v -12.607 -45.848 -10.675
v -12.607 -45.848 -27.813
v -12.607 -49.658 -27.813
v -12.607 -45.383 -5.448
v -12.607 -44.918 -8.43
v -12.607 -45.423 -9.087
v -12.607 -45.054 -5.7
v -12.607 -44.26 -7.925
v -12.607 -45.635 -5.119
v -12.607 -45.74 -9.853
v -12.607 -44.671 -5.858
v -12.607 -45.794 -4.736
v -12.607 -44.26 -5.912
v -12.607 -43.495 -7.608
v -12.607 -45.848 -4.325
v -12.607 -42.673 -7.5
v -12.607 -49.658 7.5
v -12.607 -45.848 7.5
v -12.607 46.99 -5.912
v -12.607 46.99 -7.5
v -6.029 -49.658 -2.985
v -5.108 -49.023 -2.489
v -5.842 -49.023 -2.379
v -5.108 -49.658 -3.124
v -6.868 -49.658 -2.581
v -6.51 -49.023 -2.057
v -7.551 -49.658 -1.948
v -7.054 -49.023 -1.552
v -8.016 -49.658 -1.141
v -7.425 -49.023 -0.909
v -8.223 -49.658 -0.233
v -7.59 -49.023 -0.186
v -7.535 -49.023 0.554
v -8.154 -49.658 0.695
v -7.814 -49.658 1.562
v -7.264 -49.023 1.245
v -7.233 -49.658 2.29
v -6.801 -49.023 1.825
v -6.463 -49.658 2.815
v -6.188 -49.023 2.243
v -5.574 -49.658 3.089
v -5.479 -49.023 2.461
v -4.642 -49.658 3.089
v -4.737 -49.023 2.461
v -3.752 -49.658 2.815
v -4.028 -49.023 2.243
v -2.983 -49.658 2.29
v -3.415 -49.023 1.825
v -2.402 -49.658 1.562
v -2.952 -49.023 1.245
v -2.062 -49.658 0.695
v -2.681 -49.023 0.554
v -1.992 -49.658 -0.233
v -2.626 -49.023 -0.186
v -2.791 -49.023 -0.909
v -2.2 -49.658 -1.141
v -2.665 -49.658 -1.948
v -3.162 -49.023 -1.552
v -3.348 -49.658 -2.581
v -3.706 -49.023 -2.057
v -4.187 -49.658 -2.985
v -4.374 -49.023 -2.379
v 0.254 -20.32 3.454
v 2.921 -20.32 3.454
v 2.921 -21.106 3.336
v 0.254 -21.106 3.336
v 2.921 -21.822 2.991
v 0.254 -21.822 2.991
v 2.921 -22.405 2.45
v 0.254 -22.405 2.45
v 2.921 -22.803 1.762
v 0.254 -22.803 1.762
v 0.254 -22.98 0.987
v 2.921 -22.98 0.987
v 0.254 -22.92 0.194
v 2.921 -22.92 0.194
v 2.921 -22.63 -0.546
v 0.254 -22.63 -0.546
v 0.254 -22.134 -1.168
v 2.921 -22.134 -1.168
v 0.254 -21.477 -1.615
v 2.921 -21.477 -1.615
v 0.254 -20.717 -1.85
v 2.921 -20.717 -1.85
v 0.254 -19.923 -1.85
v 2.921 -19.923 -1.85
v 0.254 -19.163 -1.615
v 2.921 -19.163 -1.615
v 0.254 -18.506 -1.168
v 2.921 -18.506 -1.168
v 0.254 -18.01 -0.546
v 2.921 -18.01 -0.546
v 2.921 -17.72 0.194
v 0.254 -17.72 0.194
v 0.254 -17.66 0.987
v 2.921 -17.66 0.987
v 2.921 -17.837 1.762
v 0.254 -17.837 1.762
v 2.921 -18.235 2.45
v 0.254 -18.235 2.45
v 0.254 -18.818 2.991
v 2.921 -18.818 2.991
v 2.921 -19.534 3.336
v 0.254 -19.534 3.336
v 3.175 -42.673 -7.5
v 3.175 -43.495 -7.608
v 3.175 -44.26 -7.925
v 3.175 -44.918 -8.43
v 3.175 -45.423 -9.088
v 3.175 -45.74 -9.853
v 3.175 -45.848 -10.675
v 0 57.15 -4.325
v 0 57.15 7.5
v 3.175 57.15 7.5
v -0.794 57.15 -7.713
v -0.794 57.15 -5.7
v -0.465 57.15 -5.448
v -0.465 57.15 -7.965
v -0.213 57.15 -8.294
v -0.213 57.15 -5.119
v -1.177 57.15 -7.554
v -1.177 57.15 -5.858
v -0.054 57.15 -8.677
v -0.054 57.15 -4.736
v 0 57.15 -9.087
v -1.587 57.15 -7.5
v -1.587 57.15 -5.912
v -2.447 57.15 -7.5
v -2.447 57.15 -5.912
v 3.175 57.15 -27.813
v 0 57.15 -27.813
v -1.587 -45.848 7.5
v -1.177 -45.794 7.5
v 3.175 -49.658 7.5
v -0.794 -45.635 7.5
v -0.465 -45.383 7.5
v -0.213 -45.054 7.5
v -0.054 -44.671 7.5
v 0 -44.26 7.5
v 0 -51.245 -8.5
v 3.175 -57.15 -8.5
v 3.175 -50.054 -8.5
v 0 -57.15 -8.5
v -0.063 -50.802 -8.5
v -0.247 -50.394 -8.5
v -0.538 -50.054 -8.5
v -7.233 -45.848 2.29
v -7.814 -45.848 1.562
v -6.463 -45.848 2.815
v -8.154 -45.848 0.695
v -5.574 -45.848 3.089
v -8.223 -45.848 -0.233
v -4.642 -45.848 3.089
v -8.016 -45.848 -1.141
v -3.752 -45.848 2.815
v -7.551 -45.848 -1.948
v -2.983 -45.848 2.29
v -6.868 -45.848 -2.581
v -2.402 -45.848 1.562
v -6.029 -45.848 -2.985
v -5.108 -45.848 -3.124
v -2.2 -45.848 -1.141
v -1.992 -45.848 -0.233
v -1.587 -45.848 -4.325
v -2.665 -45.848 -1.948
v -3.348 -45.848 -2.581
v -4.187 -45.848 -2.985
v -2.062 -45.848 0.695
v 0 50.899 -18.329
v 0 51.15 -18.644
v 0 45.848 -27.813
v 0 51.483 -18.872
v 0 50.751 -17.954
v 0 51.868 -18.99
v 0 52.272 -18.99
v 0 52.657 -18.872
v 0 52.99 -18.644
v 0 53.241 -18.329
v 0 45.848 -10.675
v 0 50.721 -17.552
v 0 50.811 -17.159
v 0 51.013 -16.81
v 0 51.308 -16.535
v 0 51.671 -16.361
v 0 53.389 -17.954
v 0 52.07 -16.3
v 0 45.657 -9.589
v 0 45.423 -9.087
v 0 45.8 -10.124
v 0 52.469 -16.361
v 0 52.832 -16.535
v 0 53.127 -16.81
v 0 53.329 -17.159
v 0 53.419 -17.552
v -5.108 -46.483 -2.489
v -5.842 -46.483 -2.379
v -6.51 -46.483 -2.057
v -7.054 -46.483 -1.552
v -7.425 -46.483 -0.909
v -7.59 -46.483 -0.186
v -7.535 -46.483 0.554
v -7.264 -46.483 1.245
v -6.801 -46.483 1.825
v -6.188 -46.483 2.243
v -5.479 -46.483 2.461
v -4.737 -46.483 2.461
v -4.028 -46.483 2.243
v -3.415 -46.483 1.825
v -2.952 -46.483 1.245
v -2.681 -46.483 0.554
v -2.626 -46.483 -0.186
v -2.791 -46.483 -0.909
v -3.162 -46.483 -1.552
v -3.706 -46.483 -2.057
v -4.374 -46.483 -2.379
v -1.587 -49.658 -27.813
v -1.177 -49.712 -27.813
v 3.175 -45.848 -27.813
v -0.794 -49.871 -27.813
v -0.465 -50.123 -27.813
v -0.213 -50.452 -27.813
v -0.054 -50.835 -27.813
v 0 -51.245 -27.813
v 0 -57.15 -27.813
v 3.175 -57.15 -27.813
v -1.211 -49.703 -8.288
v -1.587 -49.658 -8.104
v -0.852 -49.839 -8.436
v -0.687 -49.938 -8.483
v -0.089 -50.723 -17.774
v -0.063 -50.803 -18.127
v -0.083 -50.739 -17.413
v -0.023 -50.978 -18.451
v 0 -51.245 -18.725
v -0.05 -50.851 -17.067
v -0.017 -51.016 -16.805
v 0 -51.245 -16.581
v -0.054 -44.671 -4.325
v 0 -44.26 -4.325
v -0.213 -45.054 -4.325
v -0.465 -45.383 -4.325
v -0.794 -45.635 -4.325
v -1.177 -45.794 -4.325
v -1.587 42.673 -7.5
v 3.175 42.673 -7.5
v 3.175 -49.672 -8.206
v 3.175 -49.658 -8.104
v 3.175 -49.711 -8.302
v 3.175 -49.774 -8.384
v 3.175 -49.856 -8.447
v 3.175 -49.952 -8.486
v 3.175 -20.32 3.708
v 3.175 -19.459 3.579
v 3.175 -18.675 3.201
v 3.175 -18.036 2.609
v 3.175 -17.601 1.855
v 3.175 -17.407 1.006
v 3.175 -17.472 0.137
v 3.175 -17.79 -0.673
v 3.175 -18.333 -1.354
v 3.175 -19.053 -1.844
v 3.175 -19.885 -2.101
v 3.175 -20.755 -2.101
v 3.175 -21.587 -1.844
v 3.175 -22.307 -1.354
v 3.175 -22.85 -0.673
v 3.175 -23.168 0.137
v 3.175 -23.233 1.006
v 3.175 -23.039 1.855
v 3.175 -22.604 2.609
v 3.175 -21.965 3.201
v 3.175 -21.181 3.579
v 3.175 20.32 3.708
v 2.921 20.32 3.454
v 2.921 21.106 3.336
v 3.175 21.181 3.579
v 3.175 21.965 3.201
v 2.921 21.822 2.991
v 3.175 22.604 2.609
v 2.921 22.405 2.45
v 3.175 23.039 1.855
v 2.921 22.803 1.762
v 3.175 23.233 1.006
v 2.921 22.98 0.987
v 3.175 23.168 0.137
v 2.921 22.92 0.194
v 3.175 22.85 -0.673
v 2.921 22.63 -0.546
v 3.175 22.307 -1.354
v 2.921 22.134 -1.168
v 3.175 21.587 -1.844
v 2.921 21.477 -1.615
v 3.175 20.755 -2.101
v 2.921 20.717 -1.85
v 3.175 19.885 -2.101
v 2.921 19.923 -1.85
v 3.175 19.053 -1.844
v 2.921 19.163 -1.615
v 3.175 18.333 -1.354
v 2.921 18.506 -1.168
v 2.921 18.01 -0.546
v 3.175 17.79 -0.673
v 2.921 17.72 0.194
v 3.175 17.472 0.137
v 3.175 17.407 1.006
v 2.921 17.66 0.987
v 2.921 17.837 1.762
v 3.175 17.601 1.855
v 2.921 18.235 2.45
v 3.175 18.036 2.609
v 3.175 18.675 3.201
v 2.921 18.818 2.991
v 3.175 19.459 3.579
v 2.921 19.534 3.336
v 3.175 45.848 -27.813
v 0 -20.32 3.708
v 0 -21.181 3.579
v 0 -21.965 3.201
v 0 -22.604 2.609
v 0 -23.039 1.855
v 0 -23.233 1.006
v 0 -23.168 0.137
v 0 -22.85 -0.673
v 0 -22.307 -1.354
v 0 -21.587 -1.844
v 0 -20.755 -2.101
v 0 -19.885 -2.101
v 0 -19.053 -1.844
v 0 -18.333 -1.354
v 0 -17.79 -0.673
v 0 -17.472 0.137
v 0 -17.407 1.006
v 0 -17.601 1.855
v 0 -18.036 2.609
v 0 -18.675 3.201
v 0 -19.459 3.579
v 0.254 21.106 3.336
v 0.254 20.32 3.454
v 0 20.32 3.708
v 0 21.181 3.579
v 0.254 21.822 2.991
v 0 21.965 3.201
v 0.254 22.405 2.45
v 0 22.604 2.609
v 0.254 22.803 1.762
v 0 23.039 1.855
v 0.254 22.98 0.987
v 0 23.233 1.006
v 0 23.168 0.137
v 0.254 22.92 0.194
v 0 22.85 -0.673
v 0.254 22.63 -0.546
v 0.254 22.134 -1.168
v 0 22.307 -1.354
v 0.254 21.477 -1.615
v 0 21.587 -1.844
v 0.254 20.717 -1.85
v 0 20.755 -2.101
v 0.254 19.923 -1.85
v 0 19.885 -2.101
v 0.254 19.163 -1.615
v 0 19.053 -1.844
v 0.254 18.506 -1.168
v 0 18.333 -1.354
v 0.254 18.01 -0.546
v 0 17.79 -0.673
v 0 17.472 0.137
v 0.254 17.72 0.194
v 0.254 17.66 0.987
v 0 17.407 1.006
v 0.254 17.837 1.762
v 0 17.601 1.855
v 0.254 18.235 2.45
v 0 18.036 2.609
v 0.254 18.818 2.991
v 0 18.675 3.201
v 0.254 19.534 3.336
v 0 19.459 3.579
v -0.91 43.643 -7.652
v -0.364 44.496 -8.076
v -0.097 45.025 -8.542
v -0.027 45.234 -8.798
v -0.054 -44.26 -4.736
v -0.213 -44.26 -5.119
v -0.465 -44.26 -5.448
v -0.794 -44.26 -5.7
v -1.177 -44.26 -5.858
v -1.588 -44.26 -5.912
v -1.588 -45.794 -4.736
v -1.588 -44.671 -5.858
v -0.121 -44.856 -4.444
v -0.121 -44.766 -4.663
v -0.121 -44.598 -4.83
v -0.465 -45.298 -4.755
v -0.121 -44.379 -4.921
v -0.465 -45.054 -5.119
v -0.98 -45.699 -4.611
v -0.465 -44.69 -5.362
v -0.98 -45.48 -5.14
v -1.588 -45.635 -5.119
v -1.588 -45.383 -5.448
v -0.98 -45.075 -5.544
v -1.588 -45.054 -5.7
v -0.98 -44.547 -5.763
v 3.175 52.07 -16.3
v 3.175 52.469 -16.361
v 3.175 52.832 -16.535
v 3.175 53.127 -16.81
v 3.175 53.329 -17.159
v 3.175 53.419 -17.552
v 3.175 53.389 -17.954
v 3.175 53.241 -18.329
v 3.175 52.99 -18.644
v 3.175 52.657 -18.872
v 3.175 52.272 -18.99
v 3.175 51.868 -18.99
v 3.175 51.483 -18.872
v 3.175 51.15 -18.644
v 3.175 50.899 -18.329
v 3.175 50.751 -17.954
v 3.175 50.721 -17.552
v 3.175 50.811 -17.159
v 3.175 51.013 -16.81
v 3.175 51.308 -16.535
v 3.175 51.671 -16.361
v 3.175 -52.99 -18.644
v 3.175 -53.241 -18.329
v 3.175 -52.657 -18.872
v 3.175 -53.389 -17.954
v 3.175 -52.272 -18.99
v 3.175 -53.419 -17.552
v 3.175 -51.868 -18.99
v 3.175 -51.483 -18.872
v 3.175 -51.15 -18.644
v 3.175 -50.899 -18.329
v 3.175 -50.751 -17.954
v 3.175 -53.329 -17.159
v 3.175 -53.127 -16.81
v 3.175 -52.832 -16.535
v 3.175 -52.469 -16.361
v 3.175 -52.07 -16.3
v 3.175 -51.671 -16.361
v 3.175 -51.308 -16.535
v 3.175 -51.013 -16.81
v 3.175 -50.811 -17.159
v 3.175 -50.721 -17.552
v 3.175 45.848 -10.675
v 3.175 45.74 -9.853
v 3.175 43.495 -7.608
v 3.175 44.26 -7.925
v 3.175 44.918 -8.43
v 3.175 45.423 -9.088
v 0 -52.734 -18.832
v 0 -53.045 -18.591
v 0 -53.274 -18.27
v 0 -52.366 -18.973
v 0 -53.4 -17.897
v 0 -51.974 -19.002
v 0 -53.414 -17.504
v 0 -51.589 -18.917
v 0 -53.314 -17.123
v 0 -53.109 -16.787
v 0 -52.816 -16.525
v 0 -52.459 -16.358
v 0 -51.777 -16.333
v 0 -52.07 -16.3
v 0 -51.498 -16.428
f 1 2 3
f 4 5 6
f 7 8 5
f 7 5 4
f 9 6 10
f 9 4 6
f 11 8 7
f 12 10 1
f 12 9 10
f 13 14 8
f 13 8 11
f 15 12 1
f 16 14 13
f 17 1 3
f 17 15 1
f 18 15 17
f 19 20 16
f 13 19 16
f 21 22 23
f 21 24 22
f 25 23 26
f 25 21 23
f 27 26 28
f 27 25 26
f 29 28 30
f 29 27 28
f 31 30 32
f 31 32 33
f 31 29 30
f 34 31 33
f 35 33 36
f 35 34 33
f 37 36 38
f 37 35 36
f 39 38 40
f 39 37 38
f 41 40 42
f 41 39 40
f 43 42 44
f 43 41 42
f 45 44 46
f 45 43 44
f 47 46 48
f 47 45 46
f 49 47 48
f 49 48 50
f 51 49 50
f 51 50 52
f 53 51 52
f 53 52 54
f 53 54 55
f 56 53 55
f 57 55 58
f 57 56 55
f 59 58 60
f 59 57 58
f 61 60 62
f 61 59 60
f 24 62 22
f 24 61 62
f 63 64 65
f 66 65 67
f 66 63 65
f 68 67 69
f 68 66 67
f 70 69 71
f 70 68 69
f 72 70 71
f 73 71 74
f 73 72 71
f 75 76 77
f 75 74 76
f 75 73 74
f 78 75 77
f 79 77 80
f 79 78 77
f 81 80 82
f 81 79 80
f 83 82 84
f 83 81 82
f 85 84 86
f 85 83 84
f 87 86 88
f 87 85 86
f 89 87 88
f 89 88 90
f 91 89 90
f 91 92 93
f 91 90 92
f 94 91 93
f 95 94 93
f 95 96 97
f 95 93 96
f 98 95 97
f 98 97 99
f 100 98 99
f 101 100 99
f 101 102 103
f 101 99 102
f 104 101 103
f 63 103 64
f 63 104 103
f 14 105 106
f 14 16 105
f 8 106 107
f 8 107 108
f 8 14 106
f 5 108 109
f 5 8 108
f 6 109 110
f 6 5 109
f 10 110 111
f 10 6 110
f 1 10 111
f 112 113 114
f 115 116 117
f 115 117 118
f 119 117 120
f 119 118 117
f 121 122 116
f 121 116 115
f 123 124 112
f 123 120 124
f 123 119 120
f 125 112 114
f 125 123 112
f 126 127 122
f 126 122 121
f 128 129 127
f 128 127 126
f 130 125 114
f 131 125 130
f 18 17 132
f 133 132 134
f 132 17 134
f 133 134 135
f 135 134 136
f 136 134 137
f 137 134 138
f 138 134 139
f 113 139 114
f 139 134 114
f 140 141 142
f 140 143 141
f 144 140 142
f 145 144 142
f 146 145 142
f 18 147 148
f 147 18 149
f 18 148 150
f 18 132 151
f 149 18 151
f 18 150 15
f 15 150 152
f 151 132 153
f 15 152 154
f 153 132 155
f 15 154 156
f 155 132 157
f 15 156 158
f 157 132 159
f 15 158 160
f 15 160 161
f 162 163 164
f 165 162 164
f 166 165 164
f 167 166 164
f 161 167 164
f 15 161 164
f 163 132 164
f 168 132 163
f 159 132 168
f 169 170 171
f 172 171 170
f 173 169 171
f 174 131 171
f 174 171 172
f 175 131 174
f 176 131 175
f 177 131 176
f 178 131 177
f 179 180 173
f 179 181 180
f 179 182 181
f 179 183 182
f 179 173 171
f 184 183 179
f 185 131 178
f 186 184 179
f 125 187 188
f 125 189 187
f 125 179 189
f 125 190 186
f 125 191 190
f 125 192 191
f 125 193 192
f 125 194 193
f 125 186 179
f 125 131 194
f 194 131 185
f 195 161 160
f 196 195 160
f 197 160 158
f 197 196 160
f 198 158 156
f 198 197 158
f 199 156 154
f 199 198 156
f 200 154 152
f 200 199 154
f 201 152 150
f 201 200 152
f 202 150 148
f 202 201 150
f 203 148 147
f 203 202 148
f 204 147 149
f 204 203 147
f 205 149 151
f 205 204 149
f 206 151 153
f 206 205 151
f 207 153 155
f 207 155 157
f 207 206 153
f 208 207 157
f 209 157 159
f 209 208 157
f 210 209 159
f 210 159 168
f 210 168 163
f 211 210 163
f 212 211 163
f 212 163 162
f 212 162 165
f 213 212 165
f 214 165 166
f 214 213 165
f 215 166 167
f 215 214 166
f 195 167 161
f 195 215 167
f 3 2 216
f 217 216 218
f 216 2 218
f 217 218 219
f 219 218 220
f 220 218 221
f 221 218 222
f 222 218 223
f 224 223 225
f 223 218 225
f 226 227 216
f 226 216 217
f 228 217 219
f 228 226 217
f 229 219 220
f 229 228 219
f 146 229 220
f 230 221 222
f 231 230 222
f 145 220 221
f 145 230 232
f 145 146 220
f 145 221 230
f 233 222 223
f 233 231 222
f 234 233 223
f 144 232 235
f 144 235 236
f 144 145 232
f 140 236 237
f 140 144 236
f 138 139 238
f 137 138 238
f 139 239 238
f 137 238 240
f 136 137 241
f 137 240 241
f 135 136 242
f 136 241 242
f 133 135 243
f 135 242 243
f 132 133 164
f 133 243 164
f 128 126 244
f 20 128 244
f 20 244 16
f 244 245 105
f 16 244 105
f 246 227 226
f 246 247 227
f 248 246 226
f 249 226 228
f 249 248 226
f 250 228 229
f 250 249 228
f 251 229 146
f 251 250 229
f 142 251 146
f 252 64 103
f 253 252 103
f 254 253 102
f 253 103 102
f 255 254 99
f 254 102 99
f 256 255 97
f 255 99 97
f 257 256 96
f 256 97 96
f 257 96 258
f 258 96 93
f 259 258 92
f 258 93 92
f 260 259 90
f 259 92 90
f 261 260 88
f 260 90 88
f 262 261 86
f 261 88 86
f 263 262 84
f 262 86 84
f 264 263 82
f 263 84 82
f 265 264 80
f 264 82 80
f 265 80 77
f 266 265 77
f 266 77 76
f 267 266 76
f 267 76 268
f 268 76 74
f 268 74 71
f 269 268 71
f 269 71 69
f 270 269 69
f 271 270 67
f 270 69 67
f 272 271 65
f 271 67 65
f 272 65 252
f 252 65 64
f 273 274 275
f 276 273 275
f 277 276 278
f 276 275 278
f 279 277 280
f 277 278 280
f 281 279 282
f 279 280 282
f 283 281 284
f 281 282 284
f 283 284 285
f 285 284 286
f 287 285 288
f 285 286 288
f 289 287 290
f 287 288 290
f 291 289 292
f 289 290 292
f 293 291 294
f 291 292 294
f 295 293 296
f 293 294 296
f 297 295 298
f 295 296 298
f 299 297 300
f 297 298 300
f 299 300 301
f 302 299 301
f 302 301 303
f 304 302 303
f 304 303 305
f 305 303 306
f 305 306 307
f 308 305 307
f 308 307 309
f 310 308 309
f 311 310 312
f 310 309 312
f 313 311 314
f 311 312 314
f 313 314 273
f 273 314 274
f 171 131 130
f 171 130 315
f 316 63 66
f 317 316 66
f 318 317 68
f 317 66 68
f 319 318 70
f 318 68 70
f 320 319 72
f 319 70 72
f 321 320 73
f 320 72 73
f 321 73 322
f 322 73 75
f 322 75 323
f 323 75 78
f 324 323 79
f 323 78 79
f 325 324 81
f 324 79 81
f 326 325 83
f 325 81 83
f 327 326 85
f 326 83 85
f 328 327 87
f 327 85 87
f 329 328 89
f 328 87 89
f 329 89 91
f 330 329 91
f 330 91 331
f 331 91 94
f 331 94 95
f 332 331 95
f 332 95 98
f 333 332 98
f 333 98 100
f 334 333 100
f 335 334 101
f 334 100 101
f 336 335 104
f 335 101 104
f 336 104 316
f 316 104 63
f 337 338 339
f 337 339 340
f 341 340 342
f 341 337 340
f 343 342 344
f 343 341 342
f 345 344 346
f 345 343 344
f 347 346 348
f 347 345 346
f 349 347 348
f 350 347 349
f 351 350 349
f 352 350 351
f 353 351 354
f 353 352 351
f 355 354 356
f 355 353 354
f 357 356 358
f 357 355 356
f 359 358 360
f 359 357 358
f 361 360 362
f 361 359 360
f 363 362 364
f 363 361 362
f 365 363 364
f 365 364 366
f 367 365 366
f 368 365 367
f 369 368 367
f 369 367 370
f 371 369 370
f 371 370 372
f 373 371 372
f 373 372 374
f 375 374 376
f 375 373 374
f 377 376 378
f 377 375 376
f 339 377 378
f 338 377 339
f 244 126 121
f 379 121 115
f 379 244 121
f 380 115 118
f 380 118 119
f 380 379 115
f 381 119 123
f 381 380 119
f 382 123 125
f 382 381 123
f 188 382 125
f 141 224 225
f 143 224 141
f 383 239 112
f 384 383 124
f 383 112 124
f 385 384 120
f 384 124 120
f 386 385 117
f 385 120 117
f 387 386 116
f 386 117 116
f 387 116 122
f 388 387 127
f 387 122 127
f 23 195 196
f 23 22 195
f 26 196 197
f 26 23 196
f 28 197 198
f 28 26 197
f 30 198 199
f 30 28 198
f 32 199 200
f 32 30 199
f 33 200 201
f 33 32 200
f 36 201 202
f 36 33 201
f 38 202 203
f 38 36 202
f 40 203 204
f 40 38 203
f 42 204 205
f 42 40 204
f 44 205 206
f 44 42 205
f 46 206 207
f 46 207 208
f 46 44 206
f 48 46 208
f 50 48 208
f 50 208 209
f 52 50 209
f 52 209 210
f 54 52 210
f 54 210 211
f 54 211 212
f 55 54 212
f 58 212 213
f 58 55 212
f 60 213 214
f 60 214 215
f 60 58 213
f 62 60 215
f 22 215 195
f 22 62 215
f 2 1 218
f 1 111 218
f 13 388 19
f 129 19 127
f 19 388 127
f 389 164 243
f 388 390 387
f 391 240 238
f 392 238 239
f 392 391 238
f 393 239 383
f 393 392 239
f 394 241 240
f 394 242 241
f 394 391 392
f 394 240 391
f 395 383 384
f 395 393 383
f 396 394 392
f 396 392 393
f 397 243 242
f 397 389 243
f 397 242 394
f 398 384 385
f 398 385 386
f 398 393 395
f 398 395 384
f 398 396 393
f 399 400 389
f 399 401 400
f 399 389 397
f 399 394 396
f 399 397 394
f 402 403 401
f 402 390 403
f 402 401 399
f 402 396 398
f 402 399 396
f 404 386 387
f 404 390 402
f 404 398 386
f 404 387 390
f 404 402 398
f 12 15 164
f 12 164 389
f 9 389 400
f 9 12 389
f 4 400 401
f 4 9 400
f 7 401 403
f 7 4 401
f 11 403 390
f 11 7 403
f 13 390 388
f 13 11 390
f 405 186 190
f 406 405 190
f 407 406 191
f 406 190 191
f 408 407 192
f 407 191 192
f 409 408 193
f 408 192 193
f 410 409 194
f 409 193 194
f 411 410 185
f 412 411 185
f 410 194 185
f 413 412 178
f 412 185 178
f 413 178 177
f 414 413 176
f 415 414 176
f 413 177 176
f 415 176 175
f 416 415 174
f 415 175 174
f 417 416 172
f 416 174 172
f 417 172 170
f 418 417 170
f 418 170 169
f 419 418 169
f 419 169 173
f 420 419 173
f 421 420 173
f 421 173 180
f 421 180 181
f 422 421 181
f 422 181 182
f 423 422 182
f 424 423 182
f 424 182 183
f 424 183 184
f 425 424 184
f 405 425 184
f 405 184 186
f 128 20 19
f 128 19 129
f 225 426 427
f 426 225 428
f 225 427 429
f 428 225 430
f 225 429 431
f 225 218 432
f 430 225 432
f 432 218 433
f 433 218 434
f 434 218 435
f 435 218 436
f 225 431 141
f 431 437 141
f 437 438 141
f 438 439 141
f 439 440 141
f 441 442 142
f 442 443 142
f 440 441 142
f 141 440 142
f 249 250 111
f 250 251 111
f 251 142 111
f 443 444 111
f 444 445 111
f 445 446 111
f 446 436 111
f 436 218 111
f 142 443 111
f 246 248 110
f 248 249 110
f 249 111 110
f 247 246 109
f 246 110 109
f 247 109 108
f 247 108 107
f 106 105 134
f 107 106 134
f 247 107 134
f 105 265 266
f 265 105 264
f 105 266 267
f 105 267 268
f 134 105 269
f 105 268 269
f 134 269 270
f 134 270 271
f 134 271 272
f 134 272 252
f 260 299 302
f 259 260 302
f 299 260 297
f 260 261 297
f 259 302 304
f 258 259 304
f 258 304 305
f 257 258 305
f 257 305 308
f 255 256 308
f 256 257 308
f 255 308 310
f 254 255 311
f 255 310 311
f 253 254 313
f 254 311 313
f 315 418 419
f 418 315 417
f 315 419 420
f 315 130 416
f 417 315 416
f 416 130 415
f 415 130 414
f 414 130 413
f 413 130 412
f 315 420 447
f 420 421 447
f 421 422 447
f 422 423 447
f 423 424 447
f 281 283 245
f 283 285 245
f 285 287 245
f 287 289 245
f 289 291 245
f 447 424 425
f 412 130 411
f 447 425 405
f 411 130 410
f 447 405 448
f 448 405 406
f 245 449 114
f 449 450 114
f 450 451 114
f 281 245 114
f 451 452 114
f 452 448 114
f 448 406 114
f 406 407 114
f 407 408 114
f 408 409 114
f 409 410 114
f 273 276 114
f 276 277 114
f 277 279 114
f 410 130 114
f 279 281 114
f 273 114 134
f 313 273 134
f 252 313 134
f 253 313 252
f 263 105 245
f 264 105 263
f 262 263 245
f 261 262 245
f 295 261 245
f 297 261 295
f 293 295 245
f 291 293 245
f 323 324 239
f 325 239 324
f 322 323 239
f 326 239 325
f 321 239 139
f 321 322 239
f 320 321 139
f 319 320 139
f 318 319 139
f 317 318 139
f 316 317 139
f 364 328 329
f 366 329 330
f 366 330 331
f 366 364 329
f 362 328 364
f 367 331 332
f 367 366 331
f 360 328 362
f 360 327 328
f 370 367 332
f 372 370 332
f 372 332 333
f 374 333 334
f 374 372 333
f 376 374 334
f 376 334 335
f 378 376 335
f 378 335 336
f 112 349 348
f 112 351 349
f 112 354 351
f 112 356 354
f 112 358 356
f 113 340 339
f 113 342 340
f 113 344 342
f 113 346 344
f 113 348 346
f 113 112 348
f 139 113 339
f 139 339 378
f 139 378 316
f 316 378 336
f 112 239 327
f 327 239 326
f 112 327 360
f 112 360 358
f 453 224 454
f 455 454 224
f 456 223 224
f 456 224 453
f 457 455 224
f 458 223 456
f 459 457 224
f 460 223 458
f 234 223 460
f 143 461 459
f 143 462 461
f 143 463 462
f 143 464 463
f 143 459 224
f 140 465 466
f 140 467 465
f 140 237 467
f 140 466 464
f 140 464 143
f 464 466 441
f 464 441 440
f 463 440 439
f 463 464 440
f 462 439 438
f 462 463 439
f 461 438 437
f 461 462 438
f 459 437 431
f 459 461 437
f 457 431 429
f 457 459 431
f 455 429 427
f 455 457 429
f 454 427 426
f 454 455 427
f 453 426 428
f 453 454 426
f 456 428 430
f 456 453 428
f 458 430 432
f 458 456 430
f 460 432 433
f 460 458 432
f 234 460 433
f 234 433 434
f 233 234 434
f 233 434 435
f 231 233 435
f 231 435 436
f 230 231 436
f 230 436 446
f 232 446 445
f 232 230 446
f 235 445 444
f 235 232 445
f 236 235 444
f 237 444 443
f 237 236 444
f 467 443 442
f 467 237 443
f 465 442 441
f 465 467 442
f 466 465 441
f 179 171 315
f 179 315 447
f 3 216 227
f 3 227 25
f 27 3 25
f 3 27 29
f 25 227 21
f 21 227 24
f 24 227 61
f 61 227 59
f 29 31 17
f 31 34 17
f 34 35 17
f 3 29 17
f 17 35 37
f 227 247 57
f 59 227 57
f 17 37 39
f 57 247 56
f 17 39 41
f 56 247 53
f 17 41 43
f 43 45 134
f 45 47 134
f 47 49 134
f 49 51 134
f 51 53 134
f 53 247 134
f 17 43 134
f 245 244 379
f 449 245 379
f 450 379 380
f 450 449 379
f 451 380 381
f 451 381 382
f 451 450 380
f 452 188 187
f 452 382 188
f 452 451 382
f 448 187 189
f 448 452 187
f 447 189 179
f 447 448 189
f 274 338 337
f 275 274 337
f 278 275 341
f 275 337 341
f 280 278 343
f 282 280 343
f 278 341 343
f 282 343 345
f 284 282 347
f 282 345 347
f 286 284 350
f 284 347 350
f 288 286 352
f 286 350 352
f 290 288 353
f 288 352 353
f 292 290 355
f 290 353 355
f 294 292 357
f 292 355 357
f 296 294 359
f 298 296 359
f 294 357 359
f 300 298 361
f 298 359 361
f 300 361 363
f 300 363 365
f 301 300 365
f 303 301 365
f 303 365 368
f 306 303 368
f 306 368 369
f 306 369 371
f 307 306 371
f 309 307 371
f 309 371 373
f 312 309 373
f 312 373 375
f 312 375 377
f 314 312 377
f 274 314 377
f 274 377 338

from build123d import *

# Parameters (mm, degrees)
BOSS_EXTRUDE1_DEPTH   = 3.175
BOSS_EXTRUDE2_DEPTH   = 12.60732
FILLET1_R             = 1.5875
FILLET2_R             = 3.175
CUT_EXTRUDE1_DEPTH    = 16
F_6_32_TAPPED_HOLE1_D = 2.7051
SKETCH10_R            = 2.667
CUT_EXTRUDE2_DEPTH    = 4.175
CHAMFER1_SIZE         = 0.254
FILLET3_R             = 1.5875
FILLET4_R             = 0.39624


with BuildPart() as part:
    # Sketch1 → Boss-Extrude1 (new body)
    with BuildSketch(Plane(origin=(0, 0, 0), x_dir=(0, 0, -1), z_dir=(1, 0, 0))):
        Polygon((27.813, 57.15), (27.813, 45.847999998), (7.5, 45.847999998), (7.5, -45.847999998), (27.813, -45.847999998), (27.813, -57.15), (8.5, -57.15), (8.5, -49.657999998), (-7.5, -49.657999998), (-7.5, 57.15), align=None)
    extrude(amount=BOSS_EXTRUDE1_DEPTH)

    # Sketch2 → Boss-Extrude2 (add)
    with BuildSketch(Plane.ZY):
        Polygon((7.5, -49.657999998), (7.5, -45.847999998), (-5.9125, -45.847999998), (-5.9125, 57.15), (-7.5, 57.15), (-7.5, -45.847999998), (-27.813, -45.847999998), (-27.813, -49.657999998), align=None)
    extrude(amount=BOSS_EXTRUDE2_DEPTH)

    # Sketch4 → #10 Clearance Hole1 (revolve, cut)
    with BuildSketch(Plane(origin=(-5.10794, -49.657999998, 0), x_dir=(0, 0, -1), z_dir=(1, 0, 0))):
        Polygon((0, 0), (0, 3.81), (3.1242, 3.81), (2.4892, 3.175), (2.4892, 0.635), (3.1242, 0), align=None)
    revolve(axis=Axis((-5.10794, -56.007999998, 0), (0, 1, 0)), mode=Mode.SUBTRACT)

    # Fillet1
    fillet1_edges = [part.edges().sort_by_distance(p)[0] for p in [
        (-6.30366, -45.847999998, -5.9125),
    ]]
    fillet(fillet1_edges, radius=FILLET1_R)

    # Fillet2
    fillet2_edges = [part.edges().sort_by_distance(p)[0] for p in [
        (-4.71616, -45.847999998, -7.5),
        (1.5875, 45.847999998, -7.5),
    ]]
    fillet(fillet2_edges, radius=FILLET2_R)

    # Sketch6 → Cut-Extrude1 (cut, through all)
    with BuildSketch(Plane(origin=(0, 0, -7.5), x_dir=(-1, 0, 0), z_dir=(0, 0, -1))):
        Polygon((2.447319972, 57.15), (12.607319972, 57.15), (12.607319972, 46.99), align=None)
    extrude(amount=-CUT_EXTRUDE1_DEPTH, mode=Mode.SUBTRACT)

    # #6-32 Tapped Hole1 (through all)
    with Locations(Plane(origin=(3.175, 0, 0), x_dir=(0, 0, -1), z_dir=(1, 0, 0))):
        with Locations((17.653, 52.07)):
            f_6_32_tapped_hole1 = Hole(F_6_32_TAPPED_HOLE1_D / 2)

    # Sketch10 → Cut-Extrude2 (cut, through all)
    with BuildSketch(Plane.ZY):
        with Locations((0.7874, 20.32)):
            Circle(SKETCH10_R)
    cut_extrude2 = extrude(amount=-CUT_EXTRUDE2_DEPTH, mode=Mode.SUBTRACT)

    # Mirror2: Cut-Extrude2 across plane
    add(cut_extrude2.mirror(Plane.ZX), mode=Mode.SUBTRACT)

    # Chamfer1
    chamfer1_edges = [part.edges().sort_by_distance(p)[0] for p in [
        (3.175, 20.32, -1.8796),
        (0, 20.32, -1.8796),
        (3.175, -20.32, -1.8796),
        (0, -20.32, -1.8796),
    ]]
    chamfer(chamfer1_edges, length=CHAMFER1_SIZE)

    # Fillet3
    fillet3_edges = [part.edges().sort_by_distance(p)[0] for p in [
        (0, 6.444750001, -5.9125),
        (0, -45.383032013, -5.447532015),
        (0, -49.657999998, -18.1565),
        (0, 49.911499999, -7.5),
        (0, -45.847999998, 1.5875),
    ]]
    fillet(fillet3_edges, radius=FILLET3_R)

    # Mirror1: #6-32 Tapped Hole1 across plane
    add(f_6_32_tapped_hole1.mirror(Plane.ZX), mode=Mode.SUBTRACT)

    # Fillet4
    fillet4_edges = [part.edges().sort_by_distance(p)[0] for p in [
        (0.79375, -49.657999998, -8.5),
    ]]
    fillet(fillet4_edges, radius=FILLET4_R)


solid = part.part
